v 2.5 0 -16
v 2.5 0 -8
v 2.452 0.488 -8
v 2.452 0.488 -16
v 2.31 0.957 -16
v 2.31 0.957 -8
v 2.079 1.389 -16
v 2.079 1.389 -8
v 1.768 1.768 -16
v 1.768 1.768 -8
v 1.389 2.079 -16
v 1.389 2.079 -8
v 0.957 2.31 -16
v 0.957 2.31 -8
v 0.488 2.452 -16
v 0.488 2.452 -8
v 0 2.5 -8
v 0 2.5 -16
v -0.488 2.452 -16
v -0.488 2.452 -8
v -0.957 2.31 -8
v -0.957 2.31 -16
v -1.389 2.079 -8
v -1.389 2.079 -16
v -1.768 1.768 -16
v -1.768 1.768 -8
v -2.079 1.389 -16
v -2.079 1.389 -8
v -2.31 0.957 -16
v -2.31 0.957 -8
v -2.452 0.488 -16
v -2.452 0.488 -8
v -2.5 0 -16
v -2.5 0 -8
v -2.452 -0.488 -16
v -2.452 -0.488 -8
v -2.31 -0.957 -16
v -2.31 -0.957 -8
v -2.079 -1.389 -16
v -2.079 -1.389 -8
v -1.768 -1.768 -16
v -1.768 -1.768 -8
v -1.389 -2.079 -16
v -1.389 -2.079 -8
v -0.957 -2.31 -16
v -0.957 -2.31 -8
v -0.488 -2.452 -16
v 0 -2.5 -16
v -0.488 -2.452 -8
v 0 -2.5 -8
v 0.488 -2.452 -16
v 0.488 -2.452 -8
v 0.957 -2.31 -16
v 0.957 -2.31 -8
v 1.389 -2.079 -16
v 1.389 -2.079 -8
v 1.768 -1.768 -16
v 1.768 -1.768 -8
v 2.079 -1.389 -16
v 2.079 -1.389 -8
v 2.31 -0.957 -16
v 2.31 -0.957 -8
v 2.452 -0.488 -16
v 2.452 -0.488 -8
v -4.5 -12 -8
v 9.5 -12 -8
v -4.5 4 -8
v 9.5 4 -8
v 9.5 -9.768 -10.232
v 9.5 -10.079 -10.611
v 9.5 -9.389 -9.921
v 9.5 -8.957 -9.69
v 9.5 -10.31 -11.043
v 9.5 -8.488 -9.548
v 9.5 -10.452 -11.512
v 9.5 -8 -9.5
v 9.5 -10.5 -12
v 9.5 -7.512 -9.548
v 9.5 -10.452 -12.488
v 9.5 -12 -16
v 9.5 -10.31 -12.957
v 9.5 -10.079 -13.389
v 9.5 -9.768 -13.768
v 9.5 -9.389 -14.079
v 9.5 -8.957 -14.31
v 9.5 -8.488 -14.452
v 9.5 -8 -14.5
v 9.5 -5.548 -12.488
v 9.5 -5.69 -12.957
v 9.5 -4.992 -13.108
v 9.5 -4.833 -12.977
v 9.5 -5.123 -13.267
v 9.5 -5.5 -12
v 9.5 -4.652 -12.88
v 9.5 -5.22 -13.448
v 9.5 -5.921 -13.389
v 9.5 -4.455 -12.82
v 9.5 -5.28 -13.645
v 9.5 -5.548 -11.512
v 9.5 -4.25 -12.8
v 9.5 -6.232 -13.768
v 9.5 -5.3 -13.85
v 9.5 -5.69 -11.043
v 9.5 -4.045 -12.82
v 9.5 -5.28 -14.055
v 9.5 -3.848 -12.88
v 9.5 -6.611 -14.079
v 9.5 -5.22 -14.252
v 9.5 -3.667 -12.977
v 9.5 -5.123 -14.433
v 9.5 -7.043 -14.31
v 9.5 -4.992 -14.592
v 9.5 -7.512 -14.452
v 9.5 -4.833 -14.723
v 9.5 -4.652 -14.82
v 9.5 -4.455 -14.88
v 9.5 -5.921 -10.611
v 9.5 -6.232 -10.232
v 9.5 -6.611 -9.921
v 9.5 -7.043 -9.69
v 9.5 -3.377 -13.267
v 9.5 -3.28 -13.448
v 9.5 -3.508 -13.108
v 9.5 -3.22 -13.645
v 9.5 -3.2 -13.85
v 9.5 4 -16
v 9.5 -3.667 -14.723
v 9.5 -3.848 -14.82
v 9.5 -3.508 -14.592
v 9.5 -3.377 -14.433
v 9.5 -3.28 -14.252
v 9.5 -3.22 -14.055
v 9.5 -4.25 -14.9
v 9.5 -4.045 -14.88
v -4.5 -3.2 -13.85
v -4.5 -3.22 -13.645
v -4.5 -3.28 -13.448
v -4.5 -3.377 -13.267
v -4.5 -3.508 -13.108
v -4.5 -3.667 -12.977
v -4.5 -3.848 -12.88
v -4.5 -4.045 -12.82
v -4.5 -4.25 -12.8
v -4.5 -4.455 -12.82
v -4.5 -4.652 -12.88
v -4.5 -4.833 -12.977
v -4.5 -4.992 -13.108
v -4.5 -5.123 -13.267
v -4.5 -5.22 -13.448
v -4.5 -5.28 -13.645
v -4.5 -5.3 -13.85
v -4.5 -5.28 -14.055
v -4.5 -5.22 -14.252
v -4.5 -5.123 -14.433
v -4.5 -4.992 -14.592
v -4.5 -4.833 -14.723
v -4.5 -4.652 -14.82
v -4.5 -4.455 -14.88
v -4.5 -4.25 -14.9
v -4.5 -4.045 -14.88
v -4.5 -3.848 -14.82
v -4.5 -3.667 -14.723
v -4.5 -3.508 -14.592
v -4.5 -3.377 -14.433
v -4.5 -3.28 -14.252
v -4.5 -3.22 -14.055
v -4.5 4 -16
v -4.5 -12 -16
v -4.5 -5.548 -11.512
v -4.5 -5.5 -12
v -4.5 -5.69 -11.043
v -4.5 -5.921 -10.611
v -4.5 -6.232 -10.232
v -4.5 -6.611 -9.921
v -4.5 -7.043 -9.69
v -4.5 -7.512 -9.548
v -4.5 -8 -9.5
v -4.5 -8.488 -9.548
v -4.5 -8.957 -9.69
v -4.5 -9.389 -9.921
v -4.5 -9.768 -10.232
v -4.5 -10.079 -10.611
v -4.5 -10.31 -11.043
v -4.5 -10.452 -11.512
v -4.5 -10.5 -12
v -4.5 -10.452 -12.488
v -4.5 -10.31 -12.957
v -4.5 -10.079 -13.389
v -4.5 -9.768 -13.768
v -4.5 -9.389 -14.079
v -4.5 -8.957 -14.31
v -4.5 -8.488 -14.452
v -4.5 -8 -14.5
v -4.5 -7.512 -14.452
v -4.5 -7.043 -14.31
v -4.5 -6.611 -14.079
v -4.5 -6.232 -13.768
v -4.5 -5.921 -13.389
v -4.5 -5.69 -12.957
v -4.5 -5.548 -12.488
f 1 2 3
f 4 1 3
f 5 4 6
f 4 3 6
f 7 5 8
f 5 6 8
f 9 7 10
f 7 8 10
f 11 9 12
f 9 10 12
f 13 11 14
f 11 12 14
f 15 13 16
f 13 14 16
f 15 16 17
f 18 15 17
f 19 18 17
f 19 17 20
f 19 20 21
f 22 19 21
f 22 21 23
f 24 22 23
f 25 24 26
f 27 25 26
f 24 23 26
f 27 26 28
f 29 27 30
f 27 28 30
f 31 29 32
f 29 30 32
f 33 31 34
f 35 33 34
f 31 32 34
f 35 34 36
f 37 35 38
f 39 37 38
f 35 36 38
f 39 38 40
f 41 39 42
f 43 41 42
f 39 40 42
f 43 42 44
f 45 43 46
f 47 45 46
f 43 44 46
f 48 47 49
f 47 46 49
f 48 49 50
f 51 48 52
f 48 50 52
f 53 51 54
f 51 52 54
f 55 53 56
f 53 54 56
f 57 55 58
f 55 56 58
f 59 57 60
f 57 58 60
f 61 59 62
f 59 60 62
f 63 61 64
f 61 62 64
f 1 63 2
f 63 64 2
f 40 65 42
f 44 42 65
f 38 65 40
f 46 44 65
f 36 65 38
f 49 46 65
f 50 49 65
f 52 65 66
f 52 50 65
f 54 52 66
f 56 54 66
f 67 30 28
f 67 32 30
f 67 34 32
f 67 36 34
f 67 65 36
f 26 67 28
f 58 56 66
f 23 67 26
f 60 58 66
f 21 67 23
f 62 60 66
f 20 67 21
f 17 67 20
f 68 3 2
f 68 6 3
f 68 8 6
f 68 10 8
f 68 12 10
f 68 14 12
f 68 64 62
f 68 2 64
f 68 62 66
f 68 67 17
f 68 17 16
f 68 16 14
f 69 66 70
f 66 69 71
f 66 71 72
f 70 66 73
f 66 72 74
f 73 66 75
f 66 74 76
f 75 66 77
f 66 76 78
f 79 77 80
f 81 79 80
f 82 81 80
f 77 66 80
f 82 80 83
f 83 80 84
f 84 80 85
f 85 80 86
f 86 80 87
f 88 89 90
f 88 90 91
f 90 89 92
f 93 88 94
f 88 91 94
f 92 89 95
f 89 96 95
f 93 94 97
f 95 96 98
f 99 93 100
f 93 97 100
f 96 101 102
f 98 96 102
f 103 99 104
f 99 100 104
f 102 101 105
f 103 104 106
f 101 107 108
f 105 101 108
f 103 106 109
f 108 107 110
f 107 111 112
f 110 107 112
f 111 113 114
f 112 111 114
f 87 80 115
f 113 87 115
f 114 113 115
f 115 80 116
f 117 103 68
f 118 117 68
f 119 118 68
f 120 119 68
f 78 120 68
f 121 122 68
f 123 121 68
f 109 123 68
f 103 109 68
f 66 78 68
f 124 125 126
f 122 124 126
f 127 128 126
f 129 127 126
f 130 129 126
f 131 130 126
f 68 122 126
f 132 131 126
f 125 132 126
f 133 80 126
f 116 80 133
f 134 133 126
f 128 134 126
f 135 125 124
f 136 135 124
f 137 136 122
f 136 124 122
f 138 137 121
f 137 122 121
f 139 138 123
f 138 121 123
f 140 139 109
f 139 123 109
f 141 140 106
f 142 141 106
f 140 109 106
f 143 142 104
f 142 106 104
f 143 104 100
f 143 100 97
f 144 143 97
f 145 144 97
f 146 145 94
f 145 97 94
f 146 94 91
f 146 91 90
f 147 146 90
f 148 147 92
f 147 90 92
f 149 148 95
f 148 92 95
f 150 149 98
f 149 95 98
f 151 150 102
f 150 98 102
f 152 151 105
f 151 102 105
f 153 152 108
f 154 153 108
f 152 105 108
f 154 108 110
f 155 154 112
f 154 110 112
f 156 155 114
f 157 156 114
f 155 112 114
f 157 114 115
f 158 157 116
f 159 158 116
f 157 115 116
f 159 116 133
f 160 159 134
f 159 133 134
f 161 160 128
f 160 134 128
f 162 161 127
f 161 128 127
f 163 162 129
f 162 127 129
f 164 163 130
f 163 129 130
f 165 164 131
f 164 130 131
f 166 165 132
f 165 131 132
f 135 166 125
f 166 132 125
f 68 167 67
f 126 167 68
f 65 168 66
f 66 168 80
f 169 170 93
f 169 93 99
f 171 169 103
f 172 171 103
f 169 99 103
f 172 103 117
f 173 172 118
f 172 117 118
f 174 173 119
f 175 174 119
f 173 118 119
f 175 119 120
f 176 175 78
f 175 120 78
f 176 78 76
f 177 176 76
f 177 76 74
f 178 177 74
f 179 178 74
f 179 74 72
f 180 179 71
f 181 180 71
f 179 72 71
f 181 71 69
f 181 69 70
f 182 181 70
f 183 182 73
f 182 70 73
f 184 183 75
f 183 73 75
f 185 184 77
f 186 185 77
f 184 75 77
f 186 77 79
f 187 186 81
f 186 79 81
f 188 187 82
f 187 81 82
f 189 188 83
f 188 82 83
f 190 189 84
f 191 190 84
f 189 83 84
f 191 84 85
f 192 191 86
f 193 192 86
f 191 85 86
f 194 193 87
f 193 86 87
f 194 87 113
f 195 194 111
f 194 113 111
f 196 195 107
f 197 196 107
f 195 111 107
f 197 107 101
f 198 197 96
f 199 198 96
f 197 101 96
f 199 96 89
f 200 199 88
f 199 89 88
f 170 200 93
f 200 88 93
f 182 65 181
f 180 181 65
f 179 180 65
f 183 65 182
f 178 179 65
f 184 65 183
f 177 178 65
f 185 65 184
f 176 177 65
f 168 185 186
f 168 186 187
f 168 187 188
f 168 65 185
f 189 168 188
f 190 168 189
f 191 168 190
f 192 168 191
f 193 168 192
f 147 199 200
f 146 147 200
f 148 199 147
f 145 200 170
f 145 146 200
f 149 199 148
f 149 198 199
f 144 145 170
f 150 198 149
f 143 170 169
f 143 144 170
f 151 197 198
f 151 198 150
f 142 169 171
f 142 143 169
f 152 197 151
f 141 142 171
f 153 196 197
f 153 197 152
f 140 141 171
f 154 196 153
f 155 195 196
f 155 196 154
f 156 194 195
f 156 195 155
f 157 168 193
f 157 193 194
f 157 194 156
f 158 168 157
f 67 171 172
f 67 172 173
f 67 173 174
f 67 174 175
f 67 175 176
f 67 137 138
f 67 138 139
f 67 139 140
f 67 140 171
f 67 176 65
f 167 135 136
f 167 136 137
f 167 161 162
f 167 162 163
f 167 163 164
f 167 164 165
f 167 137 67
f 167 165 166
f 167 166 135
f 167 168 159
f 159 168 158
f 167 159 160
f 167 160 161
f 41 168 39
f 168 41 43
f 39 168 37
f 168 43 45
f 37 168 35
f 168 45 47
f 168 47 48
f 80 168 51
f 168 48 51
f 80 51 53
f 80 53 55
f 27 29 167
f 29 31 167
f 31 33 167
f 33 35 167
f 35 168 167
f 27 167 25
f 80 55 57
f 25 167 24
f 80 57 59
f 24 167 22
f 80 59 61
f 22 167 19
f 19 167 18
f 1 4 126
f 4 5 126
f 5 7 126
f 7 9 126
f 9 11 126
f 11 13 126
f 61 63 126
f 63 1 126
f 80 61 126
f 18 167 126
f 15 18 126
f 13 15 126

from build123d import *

# Parameters (mm, degrees)
BOX002_W              = 14
BOX002_H              = 16
BOX002_DEPTH          = 8
SKETCH003_R           = 2.5
POCKET001002002_DEPTH = 8
SKETCH004_R           = 2.5
SKETCH004_R_2         = 1.05
POCKET001002003_DEPTH = 14


with BuildPart() as part:
    # Box002 → Box002 (new body)
    with BuildSketch(Plane(origin=(-4.5, -12, -16), x_dir=(1, 0, 0), z_dir=(0, 0, 1))):
        with Locations((7, 8)):
            Rectangle(BOX002_W, BOX002_H)
    extrude(amount=BOX002_DEPTH)

    # Sketch003 → Pocket001002002 (cut)
    with BuildSketch(Plane(origin=(-4.5, -12, -8), x_dir=(1, 0, 0), z_dir=(0, 0, 1))):
        with Locations((4.5, 12)):
            Circle(SKETCH003_R)
    extrude(amount=-POCKET001002002_DEPTH, mode=Mode.SUBTRACT)

    # Sketch004 → Pocket001002003 (cut)
    with BuildSketch(Plane(origin=(9.5, -12, -16), x_dir=(0, 1, 0), z_dir=(1, 0, 0))):
        with Locations((4, 4)):
            Circle(SKETCH004_R)
        with Locations((7.75, 2.15)):
            Circle(SKETCH004_R_2)
    extrude(amount=-POCKET001002003_DEPTH, mode=Mode.SUBTRACT)


solid = part.part
